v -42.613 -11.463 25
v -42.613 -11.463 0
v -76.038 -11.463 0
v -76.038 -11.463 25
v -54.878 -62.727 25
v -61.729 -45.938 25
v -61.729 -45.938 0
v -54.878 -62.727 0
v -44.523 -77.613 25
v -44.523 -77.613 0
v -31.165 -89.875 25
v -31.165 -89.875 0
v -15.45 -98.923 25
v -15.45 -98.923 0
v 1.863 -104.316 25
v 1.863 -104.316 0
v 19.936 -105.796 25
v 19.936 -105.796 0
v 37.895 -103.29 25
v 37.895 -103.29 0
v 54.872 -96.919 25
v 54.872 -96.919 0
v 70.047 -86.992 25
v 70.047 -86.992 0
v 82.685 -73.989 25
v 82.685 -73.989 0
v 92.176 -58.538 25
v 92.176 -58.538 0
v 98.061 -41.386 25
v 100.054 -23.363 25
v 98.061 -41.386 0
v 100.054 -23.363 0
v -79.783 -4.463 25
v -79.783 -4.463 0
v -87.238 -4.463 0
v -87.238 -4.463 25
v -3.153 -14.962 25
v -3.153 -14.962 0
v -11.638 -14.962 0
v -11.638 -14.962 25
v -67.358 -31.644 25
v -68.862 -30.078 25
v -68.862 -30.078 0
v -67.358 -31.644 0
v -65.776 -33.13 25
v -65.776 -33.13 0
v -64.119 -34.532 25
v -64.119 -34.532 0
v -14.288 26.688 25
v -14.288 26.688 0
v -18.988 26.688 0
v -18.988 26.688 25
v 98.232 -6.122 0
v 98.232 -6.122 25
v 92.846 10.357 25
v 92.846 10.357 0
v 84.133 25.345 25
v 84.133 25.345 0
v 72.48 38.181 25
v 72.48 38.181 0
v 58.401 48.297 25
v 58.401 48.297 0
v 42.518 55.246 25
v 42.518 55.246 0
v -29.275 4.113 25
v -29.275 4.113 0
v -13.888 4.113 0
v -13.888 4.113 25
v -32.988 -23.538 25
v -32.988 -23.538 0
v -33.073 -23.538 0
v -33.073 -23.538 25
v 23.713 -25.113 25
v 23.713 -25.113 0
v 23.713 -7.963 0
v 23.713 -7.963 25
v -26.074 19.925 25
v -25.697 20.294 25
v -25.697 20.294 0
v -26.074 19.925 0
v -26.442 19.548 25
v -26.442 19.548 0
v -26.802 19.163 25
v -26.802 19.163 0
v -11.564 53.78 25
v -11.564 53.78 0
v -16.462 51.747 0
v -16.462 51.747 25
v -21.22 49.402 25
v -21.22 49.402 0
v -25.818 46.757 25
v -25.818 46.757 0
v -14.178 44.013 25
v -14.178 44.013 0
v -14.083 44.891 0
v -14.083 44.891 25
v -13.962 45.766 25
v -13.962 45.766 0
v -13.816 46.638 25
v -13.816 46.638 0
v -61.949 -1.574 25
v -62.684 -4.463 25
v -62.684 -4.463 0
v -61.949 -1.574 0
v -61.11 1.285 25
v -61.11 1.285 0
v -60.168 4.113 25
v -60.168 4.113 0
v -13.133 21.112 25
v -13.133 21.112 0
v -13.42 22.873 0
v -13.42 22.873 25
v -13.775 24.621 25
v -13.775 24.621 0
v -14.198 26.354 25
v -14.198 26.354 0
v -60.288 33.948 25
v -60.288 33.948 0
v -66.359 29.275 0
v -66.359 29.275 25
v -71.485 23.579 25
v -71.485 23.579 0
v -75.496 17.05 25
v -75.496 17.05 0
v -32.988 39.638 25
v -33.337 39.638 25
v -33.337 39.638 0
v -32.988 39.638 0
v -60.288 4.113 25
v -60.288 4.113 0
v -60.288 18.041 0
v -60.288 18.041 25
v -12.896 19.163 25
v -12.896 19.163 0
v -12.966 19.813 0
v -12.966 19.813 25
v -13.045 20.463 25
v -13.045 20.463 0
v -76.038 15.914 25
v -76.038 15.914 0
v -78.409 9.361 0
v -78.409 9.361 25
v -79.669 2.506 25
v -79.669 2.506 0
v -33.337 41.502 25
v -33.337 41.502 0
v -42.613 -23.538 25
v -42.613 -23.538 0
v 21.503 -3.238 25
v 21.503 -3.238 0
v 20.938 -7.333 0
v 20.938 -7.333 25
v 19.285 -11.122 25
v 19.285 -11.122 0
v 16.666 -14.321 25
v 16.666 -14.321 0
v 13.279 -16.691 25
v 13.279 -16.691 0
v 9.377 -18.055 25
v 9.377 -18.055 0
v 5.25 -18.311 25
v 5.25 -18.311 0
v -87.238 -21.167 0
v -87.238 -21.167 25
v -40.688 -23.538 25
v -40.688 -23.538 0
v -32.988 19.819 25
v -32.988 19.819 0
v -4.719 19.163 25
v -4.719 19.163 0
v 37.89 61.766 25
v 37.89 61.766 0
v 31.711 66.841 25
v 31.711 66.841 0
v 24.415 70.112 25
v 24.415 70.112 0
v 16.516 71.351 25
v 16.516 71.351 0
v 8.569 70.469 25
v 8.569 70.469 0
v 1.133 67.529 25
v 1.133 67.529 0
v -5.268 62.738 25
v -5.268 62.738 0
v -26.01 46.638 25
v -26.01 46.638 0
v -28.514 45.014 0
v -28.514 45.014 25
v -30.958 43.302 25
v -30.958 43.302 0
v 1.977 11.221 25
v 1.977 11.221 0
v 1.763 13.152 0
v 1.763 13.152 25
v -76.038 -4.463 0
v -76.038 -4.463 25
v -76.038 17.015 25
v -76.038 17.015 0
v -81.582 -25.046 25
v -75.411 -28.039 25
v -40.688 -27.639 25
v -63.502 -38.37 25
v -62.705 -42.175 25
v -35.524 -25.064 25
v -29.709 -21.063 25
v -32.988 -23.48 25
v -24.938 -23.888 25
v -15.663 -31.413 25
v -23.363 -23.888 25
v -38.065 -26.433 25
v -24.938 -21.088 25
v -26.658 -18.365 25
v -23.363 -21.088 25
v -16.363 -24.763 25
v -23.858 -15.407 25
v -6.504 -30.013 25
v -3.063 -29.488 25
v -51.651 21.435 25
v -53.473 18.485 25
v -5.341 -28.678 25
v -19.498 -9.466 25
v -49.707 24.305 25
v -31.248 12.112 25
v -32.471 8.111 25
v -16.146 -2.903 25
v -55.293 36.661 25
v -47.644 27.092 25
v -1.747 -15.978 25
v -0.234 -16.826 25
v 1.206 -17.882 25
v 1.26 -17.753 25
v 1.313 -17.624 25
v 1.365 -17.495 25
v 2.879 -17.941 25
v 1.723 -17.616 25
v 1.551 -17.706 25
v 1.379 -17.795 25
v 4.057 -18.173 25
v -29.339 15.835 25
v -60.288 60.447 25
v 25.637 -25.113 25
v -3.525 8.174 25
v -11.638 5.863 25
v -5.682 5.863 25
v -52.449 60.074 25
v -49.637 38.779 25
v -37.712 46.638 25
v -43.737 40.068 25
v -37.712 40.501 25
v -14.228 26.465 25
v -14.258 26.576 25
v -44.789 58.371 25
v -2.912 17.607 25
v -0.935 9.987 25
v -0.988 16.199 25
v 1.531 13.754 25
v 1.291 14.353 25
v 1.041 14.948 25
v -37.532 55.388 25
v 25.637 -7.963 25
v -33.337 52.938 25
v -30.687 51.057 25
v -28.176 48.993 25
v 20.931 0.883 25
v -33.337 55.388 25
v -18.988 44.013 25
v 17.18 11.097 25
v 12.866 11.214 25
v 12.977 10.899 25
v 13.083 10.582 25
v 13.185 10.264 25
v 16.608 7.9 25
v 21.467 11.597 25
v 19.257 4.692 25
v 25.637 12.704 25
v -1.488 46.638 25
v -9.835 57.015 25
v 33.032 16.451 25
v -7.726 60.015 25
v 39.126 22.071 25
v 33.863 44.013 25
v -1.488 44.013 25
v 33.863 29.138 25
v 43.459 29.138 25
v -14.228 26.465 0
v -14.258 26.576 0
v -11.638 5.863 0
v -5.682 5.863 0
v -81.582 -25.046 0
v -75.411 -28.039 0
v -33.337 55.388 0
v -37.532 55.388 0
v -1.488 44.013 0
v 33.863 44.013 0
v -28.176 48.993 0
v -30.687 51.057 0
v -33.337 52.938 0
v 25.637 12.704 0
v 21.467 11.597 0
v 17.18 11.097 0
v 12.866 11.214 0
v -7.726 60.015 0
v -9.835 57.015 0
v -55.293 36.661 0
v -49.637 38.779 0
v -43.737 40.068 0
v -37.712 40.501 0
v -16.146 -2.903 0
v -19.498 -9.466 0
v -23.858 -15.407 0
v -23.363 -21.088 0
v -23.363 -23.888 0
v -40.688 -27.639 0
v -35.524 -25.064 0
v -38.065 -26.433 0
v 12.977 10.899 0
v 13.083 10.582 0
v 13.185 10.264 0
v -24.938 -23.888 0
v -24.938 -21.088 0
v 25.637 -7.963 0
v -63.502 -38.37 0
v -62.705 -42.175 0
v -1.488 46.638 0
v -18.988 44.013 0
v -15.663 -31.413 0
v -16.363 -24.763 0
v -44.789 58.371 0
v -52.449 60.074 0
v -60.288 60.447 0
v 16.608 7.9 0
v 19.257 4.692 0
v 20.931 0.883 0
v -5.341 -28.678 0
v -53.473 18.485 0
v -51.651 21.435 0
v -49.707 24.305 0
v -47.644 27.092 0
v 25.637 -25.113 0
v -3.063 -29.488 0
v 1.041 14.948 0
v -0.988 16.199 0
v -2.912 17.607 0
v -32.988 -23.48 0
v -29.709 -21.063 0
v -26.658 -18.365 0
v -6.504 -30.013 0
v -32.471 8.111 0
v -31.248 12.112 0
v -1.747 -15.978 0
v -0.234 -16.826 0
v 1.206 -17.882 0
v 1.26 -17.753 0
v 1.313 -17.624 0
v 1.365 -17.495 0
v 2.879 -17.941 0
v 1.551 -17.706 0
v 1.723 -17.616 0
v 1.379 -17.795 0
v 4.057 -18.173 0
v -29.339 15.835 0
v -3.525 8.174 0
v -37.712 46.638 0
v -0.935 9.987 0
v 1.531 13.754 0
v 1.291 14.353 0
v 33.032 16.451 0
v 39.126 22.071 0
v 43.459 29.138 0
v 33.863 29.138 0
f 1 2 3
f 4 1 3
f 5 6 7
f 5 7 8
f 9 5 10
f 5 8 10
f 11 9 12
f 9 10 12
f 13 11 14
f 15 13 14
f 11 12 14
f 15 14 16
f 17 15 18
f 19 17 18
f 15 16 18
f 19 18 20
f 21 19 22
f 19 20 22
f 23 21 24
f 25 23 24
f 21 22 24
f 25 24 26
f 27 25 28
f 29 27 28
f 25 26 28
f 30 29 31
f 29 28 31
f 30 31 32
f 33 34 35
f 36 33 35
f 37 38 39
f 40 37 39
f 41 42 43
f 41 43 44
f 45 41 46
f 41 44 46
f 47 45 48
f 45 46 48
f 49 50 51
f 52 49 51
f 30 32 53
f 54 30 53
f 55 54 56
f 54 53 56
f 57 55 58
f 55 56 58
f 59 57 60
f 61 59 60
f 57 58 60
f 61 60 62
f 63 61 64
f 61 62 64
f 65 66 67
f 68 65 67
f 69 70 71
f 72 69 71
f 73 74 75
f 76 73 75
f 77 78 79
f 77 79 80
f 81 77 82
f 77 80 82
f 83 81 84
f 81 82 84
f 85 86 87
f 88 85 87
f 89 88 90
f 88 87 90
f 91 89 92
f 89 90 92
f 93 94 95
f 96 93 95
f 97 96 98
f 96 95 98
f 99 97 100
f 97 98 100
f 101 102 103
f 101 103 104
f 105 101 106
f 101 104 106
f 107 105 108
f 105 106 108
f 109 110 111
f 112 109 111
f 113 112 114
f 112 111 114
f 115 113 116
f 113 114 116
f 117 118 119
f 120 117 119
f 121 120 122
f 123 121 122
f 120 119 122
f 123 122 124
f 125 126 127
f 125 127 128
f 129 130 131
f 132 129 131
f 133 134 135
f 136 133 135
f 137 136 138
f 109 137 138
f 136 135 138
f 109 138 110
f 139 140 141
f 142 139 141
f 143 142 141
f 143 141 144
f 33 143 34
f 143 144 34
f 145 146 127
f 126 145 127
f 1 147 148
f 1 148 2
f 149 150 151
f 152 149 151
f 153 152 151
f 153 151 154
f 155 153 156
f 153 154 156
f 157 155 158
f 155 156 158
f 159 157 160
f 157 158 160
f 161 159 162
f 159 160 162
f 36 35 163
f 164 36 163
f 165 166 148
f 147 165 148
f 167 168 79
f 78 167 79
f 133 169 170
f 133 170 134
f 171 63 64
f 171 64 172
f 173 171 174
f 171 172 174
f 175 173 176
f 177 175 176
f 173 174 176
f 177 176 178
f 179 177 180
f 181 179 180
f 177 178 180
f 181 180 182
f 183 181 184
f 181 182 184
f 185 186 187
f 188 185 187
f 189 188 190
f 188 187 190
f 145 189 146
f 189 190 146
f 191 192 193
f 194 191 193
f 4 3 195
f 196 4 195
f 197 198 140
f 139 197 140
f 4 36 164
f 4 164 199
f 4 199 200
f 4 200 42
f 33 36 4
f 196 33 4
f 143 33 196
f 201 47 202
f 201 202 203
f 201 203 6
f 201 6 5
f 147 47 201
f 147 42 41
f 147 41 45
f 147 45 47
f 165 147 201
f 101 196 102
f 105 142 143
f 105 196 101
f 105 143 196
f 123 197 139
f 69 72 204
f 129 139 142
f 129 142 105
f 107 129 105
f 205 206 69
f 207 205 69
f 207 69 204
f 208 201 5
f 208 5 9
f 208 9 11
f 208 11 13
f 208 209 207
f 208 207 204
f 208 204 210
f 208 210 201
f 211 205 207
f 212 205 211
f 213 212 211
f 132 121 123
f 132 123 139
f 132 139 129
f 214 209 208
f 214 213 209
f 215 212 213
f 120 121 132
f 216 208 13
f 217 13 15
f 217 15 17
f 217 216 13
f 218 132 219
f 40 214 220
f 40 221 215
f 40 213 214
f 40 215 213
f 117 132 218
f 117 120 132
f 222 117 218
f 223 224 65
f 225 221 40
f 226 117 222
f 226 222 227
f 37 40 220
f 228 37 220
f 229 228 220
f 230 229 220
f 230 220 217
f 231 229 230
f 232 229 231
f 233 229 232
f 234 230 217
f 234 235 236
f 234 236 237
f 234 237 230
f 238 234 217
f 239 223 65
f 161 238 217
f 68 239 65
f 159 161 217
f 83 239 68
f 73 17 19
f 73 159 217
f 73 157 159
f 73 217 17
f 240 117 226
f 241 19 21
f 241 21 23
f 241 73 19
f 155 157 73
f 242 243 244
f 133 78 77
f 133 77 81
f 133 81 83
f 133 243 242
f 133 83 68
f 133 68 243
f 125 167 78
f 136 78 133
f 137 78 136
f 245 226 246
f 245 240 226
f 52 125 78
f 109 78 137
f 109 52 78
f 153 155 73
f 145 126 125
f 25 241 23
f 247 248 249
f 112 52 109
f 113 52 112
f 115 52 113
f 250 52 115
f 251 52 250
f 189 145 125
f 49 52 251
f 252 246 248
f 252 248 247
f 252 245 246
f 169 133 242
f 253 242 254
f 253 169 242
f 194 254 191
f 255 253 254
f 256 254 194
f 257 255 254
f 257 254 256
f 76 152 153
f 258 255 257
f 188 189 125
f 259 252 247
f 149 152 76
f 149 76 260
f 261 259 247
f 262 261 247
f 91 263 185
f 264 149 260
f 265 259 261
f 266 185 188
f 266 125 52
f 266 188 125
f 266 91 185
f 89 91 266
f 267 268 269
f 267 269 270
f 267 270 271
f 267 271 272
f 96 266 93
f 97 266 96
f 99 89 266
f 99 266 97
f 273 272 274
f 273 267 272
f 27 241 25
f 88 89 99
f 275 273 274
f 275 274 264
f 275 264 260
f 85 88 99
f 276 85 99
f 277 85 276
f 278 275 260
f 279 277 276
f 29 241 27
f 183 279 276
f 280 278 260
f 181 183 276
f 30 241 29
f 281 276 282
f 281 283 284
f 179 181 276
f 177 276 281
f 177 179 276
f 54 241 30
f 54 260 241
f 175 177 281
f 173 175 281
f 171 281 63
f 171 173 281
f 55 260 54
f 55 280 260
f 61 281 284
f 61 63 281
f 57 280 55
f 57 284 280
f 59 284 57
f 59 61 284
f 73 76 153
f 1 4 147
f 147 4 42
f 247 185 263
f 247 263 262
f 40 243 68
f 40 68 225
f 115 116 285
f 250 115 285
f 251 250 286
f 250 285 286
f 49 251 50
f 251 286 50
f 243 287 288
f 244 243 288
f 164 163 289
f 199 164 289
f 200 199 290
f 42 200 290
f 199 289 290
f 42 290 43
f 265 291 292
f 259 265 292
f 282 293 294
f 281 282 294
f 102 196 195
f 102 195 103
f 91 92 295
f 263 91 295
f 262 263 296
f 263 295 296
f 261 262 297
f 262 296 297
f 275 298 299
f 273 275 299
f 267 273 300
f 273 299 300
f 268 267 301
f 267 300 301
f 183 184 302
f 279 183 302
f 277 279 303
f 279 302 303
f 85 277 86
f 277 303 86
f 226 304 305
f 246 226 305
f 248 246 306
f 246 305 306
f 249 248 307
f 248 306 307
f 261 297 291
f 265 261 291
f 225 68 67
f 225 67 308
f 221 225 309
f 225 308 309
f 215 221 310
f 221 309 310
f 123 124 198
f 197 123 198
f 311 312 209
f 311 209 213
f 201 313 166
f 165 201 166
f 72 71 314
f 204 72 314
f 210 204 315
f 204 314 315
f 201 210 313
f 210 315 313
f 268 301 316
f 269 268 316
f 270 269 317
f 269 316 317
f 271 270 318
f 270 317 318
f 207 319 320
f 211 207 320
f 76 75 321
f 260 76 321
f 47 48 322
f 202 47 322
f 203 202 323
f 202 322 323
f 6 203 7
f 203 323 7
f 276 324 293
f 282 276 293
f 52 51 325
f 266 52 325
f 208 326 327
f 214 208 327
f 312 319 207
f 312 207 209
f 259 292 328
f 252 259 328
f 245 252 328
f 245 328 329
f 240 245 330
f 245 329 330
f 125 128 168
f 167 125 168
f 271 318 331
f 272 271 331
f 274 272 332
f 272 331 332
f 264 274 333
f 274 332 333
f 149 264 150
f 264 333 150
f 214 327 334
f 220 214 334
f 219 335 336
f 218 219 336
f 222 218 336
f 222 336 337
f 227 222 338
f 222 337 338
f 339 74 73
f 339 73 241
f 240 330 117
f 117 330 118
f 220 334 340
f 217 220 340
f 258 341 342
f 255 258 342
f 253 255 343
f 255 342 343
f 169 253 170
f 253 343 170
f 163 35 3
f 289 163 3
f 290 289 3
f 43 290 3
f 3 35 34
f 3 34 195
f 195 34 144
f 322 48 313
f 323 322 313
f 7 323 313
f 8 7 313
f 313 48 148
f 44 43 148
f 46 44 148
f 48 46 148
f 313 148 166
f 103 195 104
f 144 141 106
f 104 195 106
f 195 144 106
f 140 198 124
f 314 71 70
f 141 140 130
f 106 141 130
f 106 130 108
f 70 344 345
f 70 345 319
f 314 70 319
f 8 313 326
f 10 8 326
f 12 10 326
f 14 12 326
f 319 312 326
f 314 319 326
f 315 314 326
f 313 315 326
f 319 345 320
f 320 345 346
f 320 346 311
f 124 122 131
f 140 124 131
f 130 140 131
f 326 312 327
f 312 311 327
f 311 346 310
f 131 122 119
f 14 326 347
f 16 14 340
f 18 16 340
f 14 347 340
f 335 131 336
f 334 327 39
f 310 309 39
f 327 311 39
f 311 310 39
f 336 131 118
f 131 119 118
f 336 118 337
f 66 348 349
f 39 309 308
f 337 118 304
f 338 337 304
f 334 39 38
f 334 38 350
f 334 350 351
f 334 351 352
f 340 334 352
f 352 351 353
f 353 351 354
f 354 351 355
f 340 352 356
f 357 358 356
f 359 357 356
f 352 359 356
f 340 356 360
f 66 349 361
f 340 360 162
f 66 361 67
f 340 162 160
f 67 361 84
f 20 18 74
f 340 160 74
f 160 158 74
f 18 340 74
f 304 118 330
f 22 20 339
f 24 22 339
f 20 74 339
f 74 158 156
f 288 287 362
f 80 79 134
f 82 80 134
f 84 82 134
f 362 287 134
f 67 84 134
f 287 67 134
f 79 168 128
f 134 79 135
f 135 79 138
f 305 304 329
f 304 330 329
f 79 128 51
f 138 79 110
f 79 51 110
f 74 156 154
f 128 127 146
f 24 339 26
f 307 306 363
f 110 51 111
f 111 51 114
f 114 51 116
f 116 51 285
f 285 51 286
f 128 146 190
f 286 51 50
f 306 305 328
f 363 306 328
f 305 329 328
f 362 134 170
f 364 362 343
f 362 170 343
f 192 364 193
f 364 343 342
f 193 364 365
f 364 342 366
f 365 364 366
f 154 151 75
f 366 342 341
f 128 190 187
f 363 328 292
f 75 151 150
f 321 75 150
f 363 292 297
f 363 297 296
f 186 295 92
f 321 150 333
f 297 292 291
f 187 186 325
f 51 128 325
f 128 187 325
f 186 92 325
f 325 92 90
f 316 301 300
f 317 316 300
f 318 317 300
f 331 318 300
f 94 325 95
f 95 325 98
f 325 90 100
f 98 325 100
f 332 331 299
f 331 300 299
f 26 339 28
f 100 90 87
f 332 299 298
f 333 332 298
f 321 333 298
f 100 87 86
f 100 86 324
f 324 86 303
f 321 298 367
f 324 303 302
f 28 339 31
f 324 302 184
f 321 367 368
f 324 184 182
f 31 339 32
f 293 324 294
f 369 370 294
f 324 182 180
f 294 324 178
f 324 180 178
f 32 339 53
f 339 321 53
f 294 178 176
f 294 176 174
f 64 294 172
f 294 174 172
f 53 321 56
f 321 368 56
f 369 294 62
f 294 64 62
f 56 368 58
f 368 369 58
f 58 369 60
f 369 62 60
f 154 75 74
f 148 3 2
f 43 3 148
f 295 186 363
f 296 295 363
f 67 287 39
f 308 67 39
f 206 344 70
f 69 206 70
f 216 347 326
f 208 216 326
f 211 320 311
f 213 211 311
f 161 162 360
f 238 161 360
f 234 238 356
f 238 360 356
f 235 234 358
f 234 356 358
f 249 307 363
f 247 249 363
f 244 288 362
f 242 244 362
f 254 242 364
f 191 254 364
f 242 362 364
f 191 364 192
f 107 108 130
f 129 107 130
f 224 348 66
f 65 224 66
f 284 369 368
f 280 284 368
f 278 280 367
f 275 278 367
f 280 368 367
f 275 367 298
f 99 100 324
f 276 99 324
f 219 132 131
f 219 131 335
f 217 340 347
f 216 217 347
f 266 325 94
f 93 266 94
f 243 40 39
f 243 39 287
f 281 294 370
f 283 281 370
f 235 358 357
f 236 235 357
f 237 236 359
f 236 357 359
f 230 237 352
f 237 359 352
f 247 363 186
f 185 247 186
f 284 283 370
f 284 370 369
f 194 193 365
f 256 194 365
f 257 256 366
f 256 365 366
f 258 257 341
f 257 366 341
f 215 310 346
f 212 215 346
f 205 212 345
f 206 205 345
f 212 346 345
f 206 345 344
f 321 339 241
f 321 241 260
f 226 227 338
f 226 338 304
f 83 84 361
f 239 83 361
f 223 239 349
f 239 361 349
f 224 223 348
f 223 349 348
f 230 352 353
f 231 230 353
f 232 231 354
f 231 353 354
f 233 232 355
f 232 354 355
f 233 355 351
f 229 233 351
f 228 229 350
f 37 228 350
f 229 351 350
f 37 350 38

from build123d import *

# Parameters (mm, degrees)
F0_W     = 1.5750005841
F0_H     = 2.8000008315
F0_W_2   = 1.9249971956
F0_H_2   = 17.1500016004
F1_DEPTH = 25


with BuildPart() as f1:
    # F0 (on Top) → F1 (new body)
    with BuildSketch(Plane.XY):
        with BuildLine():
            Line((-60.287501663, 60.446803747), (-60.287501663, 55.3875006735))
            Line((-60.287501663, 55.3875006735), (-37.5316644539, 55.3875006735))
            ThreePointArc((-37.5316644539, 55.3875006735), (-48.5828066181, 59.3869339908), (-60.287501663, 60.446803747))
        make_face()
        with BuildLine():
            Line((-33.3374999464, 55.3875006735), (-37.5316644539, 55.3875006735))
            ThreePointArc((-37.5316644539, 55.3875006735), (-35.4021280758, 54.2180597299), (-33.3374999464, 52.9375020415))
            Line((-33.3374999464, 52.9375020415), (-33.3374999464, 55.3875006735))
        make_face()
        with BuildLine():
            ThreePointArc((-76.0375037789, 15.9143227634), (-75.7709475165, 16.4842679229), (-75.4959159662, 17.0501719537))
            Line((-75.4959159662, 17.0501719537), (-76.0375037789, 17.0148961203))
            Line((-76.0375037789, 17.0148961203), (-76.0375037789, 15.9143227634))
        make_face()
        with BuildLine():
            ThreePointArc((-68.8622549791, -30.0780482485), (-76.4982369381, -18.1978324961), (-79.782805532, -4.4625001028))
            Line((-79.782805532, -4.4625001028), (-87.2375071049, -4.4625001028))
            Line((-87.2375071049, -4.4625001028), (-87.2375071049, -21.1667587193))
            ThreePointArc((-87.2375071049, -21.1667587193), (-78.5521392934, -26.6580697555), (-68.8622549791, -30.0780482485))
        make_face()
        with BuildLine():
            Line((-76.0375037789, -4.4625001028), (-76.0375037789, 15.9143227634))
            ThreePointArc((-76.0375037789, 15.9143227634), (-79.1812251559, 5.9595366901), (-79.782805532, -4.4625001028))
            Line((-79.782805532, -4.4625001028), (-76.0375037789, -4.4625001028))
        make_face()
        with BuildLine():
            ThreePointArc((-64.5376681468, -30.8610487078), (-66.7093450323, -30.5213742814), (-68.8622549791, -30.0780482485))
            ThreePointArc((-68.8622549791, -30.0780482485), (-66.5768414846, -32.3968522842), (-64.1193222606, -34.5324005185))
            ThreePointArc((-64.1193222606, -34.5324005185), (-64.3490606807, -32.6990680232), (-64.5376681468, -30.8610487078))
        make_face()
        with BuildLine():
            ThreePointArc((42.5177226998, 55.2457419531), (20.5066660785, 70.9944581251), (-5.2679600643, 62.7375021577))
            Line((-5.2679600643, 62.7375021577), (2.8875006828, 62.7375021577))
            Line((2.8875006828, 62.7375021577), (2.8875006828, 57.7835510474))
            ThreePointArc((2.8875006828, 57.7835510474), (22.8576505526, 58.9357208461), (42.5177226998, 55.2457419531))
        make_face()
        with BuildLine():
            ThreePointArc((-5.2679600643, 62.7375021577), (-8.8258453921, 58.5470194508), (-11.5636143117, 53.7801216477))
            ThreePointArc((-11.5636143117, 53.7801216477), (-4.4292414273, 56.1109839846), (2.8875006828, 57.7835510474))
            Line((2.8875006828, 57.7835510474), (2.8875006828, 62.7375021577))
            Line((2.8875006828, 62.7375021577), (-5.2679600643, 62.7375021577))
        make_face()
        with BuildLine():
            ThreePointArc((-40.6875014305, -43.7207930158), (-53.105015367, -40.9157941716), (-64.1193222606, -34.5324005185))
            ThreePointArc((-64.1193222606, -34.5324005185), (-63.1259669187, -40.2772199028), (-61.7292122183, -45.9375008941))
            Line((-61.7292122183, -45.9375008941), (-40.6875014305, -45.9375008941))
            Line((-40.6875014305, -45.9375008941), (-40.6875014305, -43.7207930158))
        make_face()
        with BuildLine():
            Line((-55.2929938789, 36.6608201864), (-60.287501663, 42.9088893908))
            Line((-60.287501663, 42.9088893908), (-60.287501663, 33.9481715731))
            ThreePointArc((-60.287501663, 33.9481715731), (-57.8360079231, 35.3887491204), (-55.2929938789, 36.6608201864))
        make_face()
        with BuildLine():
            Line((-60.287501663, 18.0407582945), (-60.287501663, 33.9481715731))
            ThreePointArc((-60.287501663, 33.9481715731), (-69.0520954233, 26.543534451), (-75.4959159662, 17.0501719537))
            Line((-75.4959159662, 17.0501719537), (-60.287501663, 18.0407582945))
        make_face()
        with BuildLine():
            ThreePointArc((-25.8178493246, 46.7570204938), (-29.4132648585, 50.0472948851), (-33.3374999464, 52.9375020415))
            Line((-33.3374999464, 52.9375020415), (-33.3374999464, 46.6375015676))
            Line((-33.3374999464, 46.6375015676), (-26.010335776, 46.6375015676))
            ThreePointArc((-26.010335776, 46.6375015676), (-25.914133597, 46.6973271368), (-25.8178493246, 46.7570204938))
        make_face()
        with BuildLine():
            ThreePointArc((-11.5636143117, 53.7801216477), (-18.8602858145, 50.6127014568), (-25.8178493246, 46.7570204938))
            ThreePointArc((-25.8178493246, 46.7570204938), (-25.7592995368, 46.6973143535), (-25.7008586993, 46.6375015676))
            Line((-25.7008586993, 46.6375015676), (-13.816092535, 46.6375015676))
            ThreePointArc((-13.816092535, 46.6375015676), (-12.9125286748, 50.2790338999), (-11.5636143117, 53.7801216477))
        make_face()
        with BuildLine():
            ThreePointArc((-25.7008586993, 46.6375015676), (-25.7592995368, 46.6973143535), (-25.8178493246, 46.7570204938))
            ThreePointArc((-25.8178493246, 46.7570204938), (-25.914133597, 46.6973271368), (-26.010335776, 46.6375015676))
            Line((-26.010335776, 46.6375015676), (-25.7008586993, 46.6375015676))
        make_face()
        with BuildLine():
            Line((-76.0375037789, -11.4625003189), (-76.0375037789, -4.4625001028))
            Line((-76.0375037789, -4.4625001028), (-79.782805532, -4.4625001028))
            ThreePointArc((-79.782805532, -4.4625001028), (-76.4982369381, -18.1978324961), (-68.8622549791, -30.0780482485))
            ThreePointArc((-68.8622549791, -30.0780482485), (-66.7093450323, -30.5213742814), (-64.5376681468, -30.8610487078))
            ThreePointArc((-64.5376681468, -30.8610487078), (-64.8495079797, -21.1463820593), (-64.0161853461, -11.4625003189))
            Line((-64.0161853461, -11.4625003189), (-76.0375037789, -11.4625003189))
        make_face()
        with BuildLine():
            ThreePointArc((2.8875006828, 57.7835510474), (-4.4292414273, 56.1109839846), (-11.5636143117, 53.7801216477))
            ThreePointArc((-11.5636143117, 53.7801216477), (-12.9125286748, 50.2790338999), (-13.816092535, 46.6375015676))
            Line((-13.816092535, 46.6375015676), (-1.4875002671, 46.6375015676))
            Line((-1.4875002671, 46.6375015676), (-1.4875002671, 44.0125018358))
            Line((-1.4875002671, 44.0125018358), (2.8875006828, 44.0125018358))
            Line((2.8875006828, 44.0125018358), (2.8875006828, 57.7835510474))
        make_face()
        with BuildLine():
            ThreePointArc((42.5177226998, 55.2457419531), (22.8576505526, 58.9357208461), (2.8875006828, 57.7835510474))
            Line((2.8875006828, 57.7835510474), (2.8875006828, 44.0125018358))
            Line((2.8875006828, 44.0125018358), (33.8625051081, 44.0125018358))
            Line((33.8625051081, 44.0125018358), (33.8625051081, 29.1375014931))
            Line((33.8625051081, 29.1375014931), (43.4592417746, 29.1375014931))
            ThreePointArc((43.4592417746, 29.1375014931), (45.3455013072, 35.0445136323), (45.9832490573, 41.2124991417))
            ThreePointArc((45.9832490573, 41.2124991417), (45.1040464698, 48.4399083722), (42.5177226998, 55.2457419531))
        make_face()
        with BuildLine():
            ThreePointArc((-55.2929938789, 36.6608201864), (-57.8360079231, 35.3887491204), (-60.287501663, 33.9481715731))
            Line((-60.287501663, 33.9481715731), (-60.287501663, 18.0407582945))
            Line((-60.287501663, 18.0407582945), (-53.4729691366, 18.4846167208))
            ThreePointArc((-53.4729691366, 18.4846167208), (-50.6941725689, 22.8801712722), (-47.6438605363, 27.0918463169))
            Line((-47.6438605363, 27.0918463169), (-55.2929938789, 36.6608201864))
        make_face()
        with BuildLine():
            Line((-37.5316644539, 55.3875006735), (-60.287501663, 55.3875006735))
            Line((-60.287501663, 55.3875006735), (-60.287501663, 42.9088893908))
            Line((-60.287501663, 42.9088893908), (-55.2929938789, 36.6608201864))
            ThreePointArc((-55.2929938789, 36.6608201864), (-46.7099970075, 39.52967998), (-37.7124994993, 40.5008804737))
            Line((-37.7124994993, 40.5008804737), (-37.7124994993, 46.6375015676))
            Line((-37.7124994993, 46.6375015676), (-33.3374999464, 46.6375015676))
            Line((-33.3374999464, 46.6375015676), (-33.3374999464, 52.9375020415))
            ThreePointArc((-33.3374999464, 52.9375020415), (-35.4021280758, 54.2180597299), (-37.5316644539, 55.3875006735))
        make_face()
        with BuildLine():
            Line((-60.287501663, 18.0407582945), (-75.4959159662, 17.0501719537))
            ThreePointArc((-75.4959159662, 17.0501719537), (-75.7709475165, 16.4842679229), (-76.0375037789, 15.9143227634))
            Line((-76.0375037789, 15.9143227634), (-76.0375037789, -4.4625001028))
            Line((-76.0375037789, -4.4625001028), (-62.6842973775, -4.4625001028))
            ThreePointArc((-62.6842973775, -4.4625001028), (-61.5423184863, -0.140887759), (-60.1678587237, 4.1125002317))
            Line((-60.1678587237, 4.1125002317), (-60.287501663, 4.1125002317))
            Line((-60.287501663, 4.1125002317), (-60.287501663, 18.0407582945))
        make_face()
        with BuildLine():
            Line((-42.6125004888, -11.4625003189), (-64.0161853461, -11.4625003189))
            ThreePointArc((-64.0161853461, -11.4625003189), (-64.8495079797, -21.1463820593), (-64.5376681468, -30.8610487078))
            ThreePointArc((-64.5376681468, -30.8610487078), (-64.3490606807, -32.6990680232), (-64.1193222606, -34.5324005185))
            ThreePointArc((-64.1193222606, -34.5324005185), (-53.105015367, -40.9157941716), (-40.6875014305, -43.7207930158))
            Line((-40.6875014305, -43.7207930158), (-40.6875014305, -27.6394008172))
            Line((-40.6875014305, -27.6394008172), (-40.6875014305, -23.5375016928))
            Line((-40.6875014305, -23.5375016928), (-42.6125004888, -23.5375016928))
            Line((-42.6125004888, -23.5375016928), (-42.6125004888, -11.4625003189))
        make_face()
        with BuildLine():
            ThreePointArc((100.0542931902, -23.3625005931), (84.1333018551, 25.3450777187), (42.5177226998, 55.2457419531))
            ThreePointArc((42.5177226998, 55.2457419531), (45.1040464698, 48.4399083722), (45.9832490573, 41.2124991417))
            ThreePointArc((45.9832490573, 41.2124991417), (45.3455013072, 35.0445136323), (43.4592417746, 29.1375014931))
            ThreePointArc((43.4592417746, 29.1375014931), (36.2730193538, 19.0504654477), (25.6374981254, 12.7041454856))
            ThreePointArc((25.6374981254, 12.7041454856), (19.3323665599, 11.2700192713), (12.8664397565, 11.2135158965))
            ThreePointArc((12.8664397565, 11.2135158965), (13.0305268991, 10.7404952978), (13.1845496697, 10.2641025362))
            ThreePointArc((13.1845496697, 10.2641025362), (19.2567912305, 4.6918449856), (21.5034906945, -3.2375000883))
            ThreePointArc((21.5034906945, -3.2375000883), (16.6662139014, -14.3208752648), (5.2503431362, -18.3106555531))
            ThreePointArc((5.2503431362, -18.3106555531), (3.4658546011, -18.0684517067), (1.7228337461, -17.6157483444))
            ThreePointArc((1.7228337461, -17.6157483444), (1.4653706165, -17.7505873056), (1.2062676313, -17.8822476702))
            ThreePointArc((1.2062676313, -17.8822476702), (-11.6833563355, -20.2647599018), (-23.8580149115, -15.4071412368))
            ThreePointArc((-23.8580149115, -15.4071412368), (-28.1534469836, -19.7481587713), (-32.9875014722, -23.4800600457))
            Line((-32.9875014722, -23.4800600457), (-32.9875014722, -23.5375016928))
            Line((-32.9875014722, -23.5375016928), (-33.0733501695, -23.5375016928))
            ThreePointArc((-33.0733501695, -23.5375016928), (-36.7835289452, -25.7683160656), (-40.6875014305, -27.6394008172))
            Line((-40.6875014305, -27.6394008172), (-40.6875014305, -43.7207930158))
            Line((-40.6875014305, -43.7207930158), (-40.6875014305, -45.9375008941))
            Line((-40.6875014305, -45.9375008941), (-61.7292122183, -45.9375008941))
            ThreePointArc((-61.7292122183, -45.9375008941), (28.9843610915, -105.0379761975), (100.0542931902, -23.3625005931))
        make_face()
        with Locations((-24.1500008851, -22.4875016138)):
            Rectangle(F0_W, F0_H, mode=Mode.SUBTRACT)
        Polygon((-16.3625013083, -24.7625019401), (-5.3410292506, -28.6780244764), (-3.0625001527, -29.4875018299), (-6.5037558039, -30.0132489437), (-15.6625006348, -31.4125008881), align=None, mode=Mode.SUBTRACT)
        with Locations((24.6749995276, -16.5375014767)):
            Rectangle(F0_W_2, F0_H_2, mode=Mode.SUBTRACT)
        with BuildLine():
            ThreePointArc((-13.8878015443, 4.1125002317), (-17.6898080597, -6.2516226426), (-23.8580149115, -15.4071412368))
            ThreePointArc((-23.8580149115, -15.4071412368), (-11.6833563355, -20.2647599018), (1.2062676313, -17.8822476702))
            ThreePointArc((1.2062676313, -17.8822476702), (1.2863458282, -17.6887507337), (1.365462001, -17.4948584614))
            ThreePointArc((1.365462001, -17.4948584614), (-1.0029465105, -16.4236454299), (-3.1528093331, -14.9624999613))
            Line((-3.1528093331, -14.9624999613), (-11.6375004873, -14.9624999613))
            Line((-11.6375004873, -14.9624999613), (-11.6375004873, 4.1125002317))
            Line((-11.6375004873, 4.1125002317), (-13.8878015443, 4.1125002317))
        make_face()
        with BuildLine():
            ThreePointArc((-26.8020215903, 19.1625021398), (-30.3760334738, 14.0159051528), (-32.4708454793, 8.1105868589))
            Line((-32.4708454793, 8.1105868589), (-29.2749022002, 4.1125002317))
            Line((-29.2749022002, 4.1125002317), (-13.8878015443, 4.1125002317))
            ThreePointArc((-13.8878015443, 4.1125002317), (-12.7690712668, 11.596456773), (-12.8960376116, 19.1625021398))
            Line((-12.8960376116, 19.1625021398), (-26.8020215903, 19.1625021398))
        make_face()
        with BuildLine():
            ThreePointArc((-18.9875010401, 36.1148091341), (-25.9768398827, 38.8347214631), (-33.3374999464, 40.2732846221))
            Line((-33.3374999464, 40.2732846221), (-33.3374999464, 39.6375022829))
            Line((-33.3374999464, 39.6375022829), (-32.9875014722, 39.6375022829))
            Line((-32.9875014722, 39.6375022829), (-32.9875014722, 19.8189191699))
            Line((-32.9875014722, 19.8189191699), (-25.6973300422, 20.293757907))
            ThreePointArc((-25.6973300422, 20.293757907), (-20.3728048308, 24.1304603645), (-14.1980249826, 26.3537345941))
            ThreePointArc((-14.1980249826, 26.3537345941), (-14.2425753135, 26.5207023114), (-14.2877543869, 26.6875009984))
            Line((-14.2877543869, 26.6875009984), (-18.9875010401, 26.6875009984))
            Line((-18.9875010401, 26.6875009984), (-18.9875010401, 36.1148091341))
        make_face()
        with BuildLine():
            Line((-13.1326521775, 21.1121468607), (-25.6973300422, 20.293757907))
            ThreePointArc((-25.6973300422, 20.293757907), (-26.2591458788, 19.7373777094), (-26.8020215903, 19.1625021398))
            Line((-26.8020215903, 19.1625021398), (-12.8960376116, 19.1625021398))
            ThreePointArc((-12.8960376116, 19.1625021398), (-13.0039087804, 20.1385910575), (-13.1326521775, 21.1121468607))
        make_face()
        with BuildLine():
            ThreePointArc((-26.010335776, 46.6375015676), (-29.743617825, 44.1692464646), (-33.3374999464, 41.5020964111))
            Line((-33.3374999464, 41.5020964111), (-33.3374999464, 40.2732846221))
            ThreePointArc((-33.3374999464, 40.2732846221), (-25.9768398827, 38.8347214631), (-18.9875010401, 36.1148091341))
            Line((-18.9875010401, 36.1148091341), (-18.9875010401, 37.8427231737))
            ThreePointArc((-18.9875010401, 37.8427231737), (-22.0780231411, 42.4432789807), (-25.7008586993, 46.6375015676))
            Line((-25.7008586993, 46.6375015676), (-26.010335776, 46.6375015676))
        make_face()
        with BuildLine():
            Line((-13.816092535, 46.6375015676), (-25.7008586993, 46.6375015676))
            ThreePointArc((-25.7008586993, 46.6375015676), (-22.0780231411, 42.4432789807), (-18.9875010401, 37.8427231737))
            Line((-18.9875010401, 37.8427231737), (-18.9875010401, 44.0125018358))
            Line((-18.9875010401, 44.0125018358), (-14.1779324733, 44.0125018358))
            ThreePointArc((-14.1779324733, 44.0125018358), (-14.0258687361, 45.3289793544), (-13.816092535, 46.6375015676))
        make_face()
        with BuildLine():
            ThreePointArc((-13.1326521775, 21.1121468607), (-13.5888689785, 23.7484834671), (-14.1980249826, 26.3537345941))
            ThreePointArc((-14.1980249826, 26.3537345941), (-20.3728048308, 24.1304603645), (-25.6973300422, 20.293757907))
            Line((-25.6973300422, 20.293757907), (-13.1326521775, 21.1121468607))
        make_face()
        with BuildLine():
            ThreePointArc((1.0412029235, 14.9477739276), (-1.9640035587, 16.8840657855), (-4.7188574458, 19.1625021398))
            Line((-4.7188574458, 19.1625021398), (-12.8960376116, 19.1625021398))
            ThreePointArc((-12.8960376116, 19.1625021398), (-12.7690712668, 11.596456773), (-13.8878015443, 4.1125002317))
            Line((-13.8878015443, 4.1125002317), (-11.6375004873, 4.1125002317))
            Line((-11.6375004873, 4.1125002317), (-11.6375004873, 5.8625000529))
            Line((-11.6375004873, 5.8625000529), (-5.6824261159, 5.8625000529))
            ThreePointArc((-5.6824261159, 5.8625000529), (-2.2774442748, 9.1484543238), (1.9766668895, 11.2206355442))
            Line((1.9766668895, 11.2206355442), (1.7625642985, 13.1520195495))
            ThreePointArc((1.7625642985, 13.1520195495), (1.4121877141, 14.054035936), (1.0412029235, 14.9477739276))
        make_face()
    extrude(amount=F1_DEPTH)


solid = f1.part
